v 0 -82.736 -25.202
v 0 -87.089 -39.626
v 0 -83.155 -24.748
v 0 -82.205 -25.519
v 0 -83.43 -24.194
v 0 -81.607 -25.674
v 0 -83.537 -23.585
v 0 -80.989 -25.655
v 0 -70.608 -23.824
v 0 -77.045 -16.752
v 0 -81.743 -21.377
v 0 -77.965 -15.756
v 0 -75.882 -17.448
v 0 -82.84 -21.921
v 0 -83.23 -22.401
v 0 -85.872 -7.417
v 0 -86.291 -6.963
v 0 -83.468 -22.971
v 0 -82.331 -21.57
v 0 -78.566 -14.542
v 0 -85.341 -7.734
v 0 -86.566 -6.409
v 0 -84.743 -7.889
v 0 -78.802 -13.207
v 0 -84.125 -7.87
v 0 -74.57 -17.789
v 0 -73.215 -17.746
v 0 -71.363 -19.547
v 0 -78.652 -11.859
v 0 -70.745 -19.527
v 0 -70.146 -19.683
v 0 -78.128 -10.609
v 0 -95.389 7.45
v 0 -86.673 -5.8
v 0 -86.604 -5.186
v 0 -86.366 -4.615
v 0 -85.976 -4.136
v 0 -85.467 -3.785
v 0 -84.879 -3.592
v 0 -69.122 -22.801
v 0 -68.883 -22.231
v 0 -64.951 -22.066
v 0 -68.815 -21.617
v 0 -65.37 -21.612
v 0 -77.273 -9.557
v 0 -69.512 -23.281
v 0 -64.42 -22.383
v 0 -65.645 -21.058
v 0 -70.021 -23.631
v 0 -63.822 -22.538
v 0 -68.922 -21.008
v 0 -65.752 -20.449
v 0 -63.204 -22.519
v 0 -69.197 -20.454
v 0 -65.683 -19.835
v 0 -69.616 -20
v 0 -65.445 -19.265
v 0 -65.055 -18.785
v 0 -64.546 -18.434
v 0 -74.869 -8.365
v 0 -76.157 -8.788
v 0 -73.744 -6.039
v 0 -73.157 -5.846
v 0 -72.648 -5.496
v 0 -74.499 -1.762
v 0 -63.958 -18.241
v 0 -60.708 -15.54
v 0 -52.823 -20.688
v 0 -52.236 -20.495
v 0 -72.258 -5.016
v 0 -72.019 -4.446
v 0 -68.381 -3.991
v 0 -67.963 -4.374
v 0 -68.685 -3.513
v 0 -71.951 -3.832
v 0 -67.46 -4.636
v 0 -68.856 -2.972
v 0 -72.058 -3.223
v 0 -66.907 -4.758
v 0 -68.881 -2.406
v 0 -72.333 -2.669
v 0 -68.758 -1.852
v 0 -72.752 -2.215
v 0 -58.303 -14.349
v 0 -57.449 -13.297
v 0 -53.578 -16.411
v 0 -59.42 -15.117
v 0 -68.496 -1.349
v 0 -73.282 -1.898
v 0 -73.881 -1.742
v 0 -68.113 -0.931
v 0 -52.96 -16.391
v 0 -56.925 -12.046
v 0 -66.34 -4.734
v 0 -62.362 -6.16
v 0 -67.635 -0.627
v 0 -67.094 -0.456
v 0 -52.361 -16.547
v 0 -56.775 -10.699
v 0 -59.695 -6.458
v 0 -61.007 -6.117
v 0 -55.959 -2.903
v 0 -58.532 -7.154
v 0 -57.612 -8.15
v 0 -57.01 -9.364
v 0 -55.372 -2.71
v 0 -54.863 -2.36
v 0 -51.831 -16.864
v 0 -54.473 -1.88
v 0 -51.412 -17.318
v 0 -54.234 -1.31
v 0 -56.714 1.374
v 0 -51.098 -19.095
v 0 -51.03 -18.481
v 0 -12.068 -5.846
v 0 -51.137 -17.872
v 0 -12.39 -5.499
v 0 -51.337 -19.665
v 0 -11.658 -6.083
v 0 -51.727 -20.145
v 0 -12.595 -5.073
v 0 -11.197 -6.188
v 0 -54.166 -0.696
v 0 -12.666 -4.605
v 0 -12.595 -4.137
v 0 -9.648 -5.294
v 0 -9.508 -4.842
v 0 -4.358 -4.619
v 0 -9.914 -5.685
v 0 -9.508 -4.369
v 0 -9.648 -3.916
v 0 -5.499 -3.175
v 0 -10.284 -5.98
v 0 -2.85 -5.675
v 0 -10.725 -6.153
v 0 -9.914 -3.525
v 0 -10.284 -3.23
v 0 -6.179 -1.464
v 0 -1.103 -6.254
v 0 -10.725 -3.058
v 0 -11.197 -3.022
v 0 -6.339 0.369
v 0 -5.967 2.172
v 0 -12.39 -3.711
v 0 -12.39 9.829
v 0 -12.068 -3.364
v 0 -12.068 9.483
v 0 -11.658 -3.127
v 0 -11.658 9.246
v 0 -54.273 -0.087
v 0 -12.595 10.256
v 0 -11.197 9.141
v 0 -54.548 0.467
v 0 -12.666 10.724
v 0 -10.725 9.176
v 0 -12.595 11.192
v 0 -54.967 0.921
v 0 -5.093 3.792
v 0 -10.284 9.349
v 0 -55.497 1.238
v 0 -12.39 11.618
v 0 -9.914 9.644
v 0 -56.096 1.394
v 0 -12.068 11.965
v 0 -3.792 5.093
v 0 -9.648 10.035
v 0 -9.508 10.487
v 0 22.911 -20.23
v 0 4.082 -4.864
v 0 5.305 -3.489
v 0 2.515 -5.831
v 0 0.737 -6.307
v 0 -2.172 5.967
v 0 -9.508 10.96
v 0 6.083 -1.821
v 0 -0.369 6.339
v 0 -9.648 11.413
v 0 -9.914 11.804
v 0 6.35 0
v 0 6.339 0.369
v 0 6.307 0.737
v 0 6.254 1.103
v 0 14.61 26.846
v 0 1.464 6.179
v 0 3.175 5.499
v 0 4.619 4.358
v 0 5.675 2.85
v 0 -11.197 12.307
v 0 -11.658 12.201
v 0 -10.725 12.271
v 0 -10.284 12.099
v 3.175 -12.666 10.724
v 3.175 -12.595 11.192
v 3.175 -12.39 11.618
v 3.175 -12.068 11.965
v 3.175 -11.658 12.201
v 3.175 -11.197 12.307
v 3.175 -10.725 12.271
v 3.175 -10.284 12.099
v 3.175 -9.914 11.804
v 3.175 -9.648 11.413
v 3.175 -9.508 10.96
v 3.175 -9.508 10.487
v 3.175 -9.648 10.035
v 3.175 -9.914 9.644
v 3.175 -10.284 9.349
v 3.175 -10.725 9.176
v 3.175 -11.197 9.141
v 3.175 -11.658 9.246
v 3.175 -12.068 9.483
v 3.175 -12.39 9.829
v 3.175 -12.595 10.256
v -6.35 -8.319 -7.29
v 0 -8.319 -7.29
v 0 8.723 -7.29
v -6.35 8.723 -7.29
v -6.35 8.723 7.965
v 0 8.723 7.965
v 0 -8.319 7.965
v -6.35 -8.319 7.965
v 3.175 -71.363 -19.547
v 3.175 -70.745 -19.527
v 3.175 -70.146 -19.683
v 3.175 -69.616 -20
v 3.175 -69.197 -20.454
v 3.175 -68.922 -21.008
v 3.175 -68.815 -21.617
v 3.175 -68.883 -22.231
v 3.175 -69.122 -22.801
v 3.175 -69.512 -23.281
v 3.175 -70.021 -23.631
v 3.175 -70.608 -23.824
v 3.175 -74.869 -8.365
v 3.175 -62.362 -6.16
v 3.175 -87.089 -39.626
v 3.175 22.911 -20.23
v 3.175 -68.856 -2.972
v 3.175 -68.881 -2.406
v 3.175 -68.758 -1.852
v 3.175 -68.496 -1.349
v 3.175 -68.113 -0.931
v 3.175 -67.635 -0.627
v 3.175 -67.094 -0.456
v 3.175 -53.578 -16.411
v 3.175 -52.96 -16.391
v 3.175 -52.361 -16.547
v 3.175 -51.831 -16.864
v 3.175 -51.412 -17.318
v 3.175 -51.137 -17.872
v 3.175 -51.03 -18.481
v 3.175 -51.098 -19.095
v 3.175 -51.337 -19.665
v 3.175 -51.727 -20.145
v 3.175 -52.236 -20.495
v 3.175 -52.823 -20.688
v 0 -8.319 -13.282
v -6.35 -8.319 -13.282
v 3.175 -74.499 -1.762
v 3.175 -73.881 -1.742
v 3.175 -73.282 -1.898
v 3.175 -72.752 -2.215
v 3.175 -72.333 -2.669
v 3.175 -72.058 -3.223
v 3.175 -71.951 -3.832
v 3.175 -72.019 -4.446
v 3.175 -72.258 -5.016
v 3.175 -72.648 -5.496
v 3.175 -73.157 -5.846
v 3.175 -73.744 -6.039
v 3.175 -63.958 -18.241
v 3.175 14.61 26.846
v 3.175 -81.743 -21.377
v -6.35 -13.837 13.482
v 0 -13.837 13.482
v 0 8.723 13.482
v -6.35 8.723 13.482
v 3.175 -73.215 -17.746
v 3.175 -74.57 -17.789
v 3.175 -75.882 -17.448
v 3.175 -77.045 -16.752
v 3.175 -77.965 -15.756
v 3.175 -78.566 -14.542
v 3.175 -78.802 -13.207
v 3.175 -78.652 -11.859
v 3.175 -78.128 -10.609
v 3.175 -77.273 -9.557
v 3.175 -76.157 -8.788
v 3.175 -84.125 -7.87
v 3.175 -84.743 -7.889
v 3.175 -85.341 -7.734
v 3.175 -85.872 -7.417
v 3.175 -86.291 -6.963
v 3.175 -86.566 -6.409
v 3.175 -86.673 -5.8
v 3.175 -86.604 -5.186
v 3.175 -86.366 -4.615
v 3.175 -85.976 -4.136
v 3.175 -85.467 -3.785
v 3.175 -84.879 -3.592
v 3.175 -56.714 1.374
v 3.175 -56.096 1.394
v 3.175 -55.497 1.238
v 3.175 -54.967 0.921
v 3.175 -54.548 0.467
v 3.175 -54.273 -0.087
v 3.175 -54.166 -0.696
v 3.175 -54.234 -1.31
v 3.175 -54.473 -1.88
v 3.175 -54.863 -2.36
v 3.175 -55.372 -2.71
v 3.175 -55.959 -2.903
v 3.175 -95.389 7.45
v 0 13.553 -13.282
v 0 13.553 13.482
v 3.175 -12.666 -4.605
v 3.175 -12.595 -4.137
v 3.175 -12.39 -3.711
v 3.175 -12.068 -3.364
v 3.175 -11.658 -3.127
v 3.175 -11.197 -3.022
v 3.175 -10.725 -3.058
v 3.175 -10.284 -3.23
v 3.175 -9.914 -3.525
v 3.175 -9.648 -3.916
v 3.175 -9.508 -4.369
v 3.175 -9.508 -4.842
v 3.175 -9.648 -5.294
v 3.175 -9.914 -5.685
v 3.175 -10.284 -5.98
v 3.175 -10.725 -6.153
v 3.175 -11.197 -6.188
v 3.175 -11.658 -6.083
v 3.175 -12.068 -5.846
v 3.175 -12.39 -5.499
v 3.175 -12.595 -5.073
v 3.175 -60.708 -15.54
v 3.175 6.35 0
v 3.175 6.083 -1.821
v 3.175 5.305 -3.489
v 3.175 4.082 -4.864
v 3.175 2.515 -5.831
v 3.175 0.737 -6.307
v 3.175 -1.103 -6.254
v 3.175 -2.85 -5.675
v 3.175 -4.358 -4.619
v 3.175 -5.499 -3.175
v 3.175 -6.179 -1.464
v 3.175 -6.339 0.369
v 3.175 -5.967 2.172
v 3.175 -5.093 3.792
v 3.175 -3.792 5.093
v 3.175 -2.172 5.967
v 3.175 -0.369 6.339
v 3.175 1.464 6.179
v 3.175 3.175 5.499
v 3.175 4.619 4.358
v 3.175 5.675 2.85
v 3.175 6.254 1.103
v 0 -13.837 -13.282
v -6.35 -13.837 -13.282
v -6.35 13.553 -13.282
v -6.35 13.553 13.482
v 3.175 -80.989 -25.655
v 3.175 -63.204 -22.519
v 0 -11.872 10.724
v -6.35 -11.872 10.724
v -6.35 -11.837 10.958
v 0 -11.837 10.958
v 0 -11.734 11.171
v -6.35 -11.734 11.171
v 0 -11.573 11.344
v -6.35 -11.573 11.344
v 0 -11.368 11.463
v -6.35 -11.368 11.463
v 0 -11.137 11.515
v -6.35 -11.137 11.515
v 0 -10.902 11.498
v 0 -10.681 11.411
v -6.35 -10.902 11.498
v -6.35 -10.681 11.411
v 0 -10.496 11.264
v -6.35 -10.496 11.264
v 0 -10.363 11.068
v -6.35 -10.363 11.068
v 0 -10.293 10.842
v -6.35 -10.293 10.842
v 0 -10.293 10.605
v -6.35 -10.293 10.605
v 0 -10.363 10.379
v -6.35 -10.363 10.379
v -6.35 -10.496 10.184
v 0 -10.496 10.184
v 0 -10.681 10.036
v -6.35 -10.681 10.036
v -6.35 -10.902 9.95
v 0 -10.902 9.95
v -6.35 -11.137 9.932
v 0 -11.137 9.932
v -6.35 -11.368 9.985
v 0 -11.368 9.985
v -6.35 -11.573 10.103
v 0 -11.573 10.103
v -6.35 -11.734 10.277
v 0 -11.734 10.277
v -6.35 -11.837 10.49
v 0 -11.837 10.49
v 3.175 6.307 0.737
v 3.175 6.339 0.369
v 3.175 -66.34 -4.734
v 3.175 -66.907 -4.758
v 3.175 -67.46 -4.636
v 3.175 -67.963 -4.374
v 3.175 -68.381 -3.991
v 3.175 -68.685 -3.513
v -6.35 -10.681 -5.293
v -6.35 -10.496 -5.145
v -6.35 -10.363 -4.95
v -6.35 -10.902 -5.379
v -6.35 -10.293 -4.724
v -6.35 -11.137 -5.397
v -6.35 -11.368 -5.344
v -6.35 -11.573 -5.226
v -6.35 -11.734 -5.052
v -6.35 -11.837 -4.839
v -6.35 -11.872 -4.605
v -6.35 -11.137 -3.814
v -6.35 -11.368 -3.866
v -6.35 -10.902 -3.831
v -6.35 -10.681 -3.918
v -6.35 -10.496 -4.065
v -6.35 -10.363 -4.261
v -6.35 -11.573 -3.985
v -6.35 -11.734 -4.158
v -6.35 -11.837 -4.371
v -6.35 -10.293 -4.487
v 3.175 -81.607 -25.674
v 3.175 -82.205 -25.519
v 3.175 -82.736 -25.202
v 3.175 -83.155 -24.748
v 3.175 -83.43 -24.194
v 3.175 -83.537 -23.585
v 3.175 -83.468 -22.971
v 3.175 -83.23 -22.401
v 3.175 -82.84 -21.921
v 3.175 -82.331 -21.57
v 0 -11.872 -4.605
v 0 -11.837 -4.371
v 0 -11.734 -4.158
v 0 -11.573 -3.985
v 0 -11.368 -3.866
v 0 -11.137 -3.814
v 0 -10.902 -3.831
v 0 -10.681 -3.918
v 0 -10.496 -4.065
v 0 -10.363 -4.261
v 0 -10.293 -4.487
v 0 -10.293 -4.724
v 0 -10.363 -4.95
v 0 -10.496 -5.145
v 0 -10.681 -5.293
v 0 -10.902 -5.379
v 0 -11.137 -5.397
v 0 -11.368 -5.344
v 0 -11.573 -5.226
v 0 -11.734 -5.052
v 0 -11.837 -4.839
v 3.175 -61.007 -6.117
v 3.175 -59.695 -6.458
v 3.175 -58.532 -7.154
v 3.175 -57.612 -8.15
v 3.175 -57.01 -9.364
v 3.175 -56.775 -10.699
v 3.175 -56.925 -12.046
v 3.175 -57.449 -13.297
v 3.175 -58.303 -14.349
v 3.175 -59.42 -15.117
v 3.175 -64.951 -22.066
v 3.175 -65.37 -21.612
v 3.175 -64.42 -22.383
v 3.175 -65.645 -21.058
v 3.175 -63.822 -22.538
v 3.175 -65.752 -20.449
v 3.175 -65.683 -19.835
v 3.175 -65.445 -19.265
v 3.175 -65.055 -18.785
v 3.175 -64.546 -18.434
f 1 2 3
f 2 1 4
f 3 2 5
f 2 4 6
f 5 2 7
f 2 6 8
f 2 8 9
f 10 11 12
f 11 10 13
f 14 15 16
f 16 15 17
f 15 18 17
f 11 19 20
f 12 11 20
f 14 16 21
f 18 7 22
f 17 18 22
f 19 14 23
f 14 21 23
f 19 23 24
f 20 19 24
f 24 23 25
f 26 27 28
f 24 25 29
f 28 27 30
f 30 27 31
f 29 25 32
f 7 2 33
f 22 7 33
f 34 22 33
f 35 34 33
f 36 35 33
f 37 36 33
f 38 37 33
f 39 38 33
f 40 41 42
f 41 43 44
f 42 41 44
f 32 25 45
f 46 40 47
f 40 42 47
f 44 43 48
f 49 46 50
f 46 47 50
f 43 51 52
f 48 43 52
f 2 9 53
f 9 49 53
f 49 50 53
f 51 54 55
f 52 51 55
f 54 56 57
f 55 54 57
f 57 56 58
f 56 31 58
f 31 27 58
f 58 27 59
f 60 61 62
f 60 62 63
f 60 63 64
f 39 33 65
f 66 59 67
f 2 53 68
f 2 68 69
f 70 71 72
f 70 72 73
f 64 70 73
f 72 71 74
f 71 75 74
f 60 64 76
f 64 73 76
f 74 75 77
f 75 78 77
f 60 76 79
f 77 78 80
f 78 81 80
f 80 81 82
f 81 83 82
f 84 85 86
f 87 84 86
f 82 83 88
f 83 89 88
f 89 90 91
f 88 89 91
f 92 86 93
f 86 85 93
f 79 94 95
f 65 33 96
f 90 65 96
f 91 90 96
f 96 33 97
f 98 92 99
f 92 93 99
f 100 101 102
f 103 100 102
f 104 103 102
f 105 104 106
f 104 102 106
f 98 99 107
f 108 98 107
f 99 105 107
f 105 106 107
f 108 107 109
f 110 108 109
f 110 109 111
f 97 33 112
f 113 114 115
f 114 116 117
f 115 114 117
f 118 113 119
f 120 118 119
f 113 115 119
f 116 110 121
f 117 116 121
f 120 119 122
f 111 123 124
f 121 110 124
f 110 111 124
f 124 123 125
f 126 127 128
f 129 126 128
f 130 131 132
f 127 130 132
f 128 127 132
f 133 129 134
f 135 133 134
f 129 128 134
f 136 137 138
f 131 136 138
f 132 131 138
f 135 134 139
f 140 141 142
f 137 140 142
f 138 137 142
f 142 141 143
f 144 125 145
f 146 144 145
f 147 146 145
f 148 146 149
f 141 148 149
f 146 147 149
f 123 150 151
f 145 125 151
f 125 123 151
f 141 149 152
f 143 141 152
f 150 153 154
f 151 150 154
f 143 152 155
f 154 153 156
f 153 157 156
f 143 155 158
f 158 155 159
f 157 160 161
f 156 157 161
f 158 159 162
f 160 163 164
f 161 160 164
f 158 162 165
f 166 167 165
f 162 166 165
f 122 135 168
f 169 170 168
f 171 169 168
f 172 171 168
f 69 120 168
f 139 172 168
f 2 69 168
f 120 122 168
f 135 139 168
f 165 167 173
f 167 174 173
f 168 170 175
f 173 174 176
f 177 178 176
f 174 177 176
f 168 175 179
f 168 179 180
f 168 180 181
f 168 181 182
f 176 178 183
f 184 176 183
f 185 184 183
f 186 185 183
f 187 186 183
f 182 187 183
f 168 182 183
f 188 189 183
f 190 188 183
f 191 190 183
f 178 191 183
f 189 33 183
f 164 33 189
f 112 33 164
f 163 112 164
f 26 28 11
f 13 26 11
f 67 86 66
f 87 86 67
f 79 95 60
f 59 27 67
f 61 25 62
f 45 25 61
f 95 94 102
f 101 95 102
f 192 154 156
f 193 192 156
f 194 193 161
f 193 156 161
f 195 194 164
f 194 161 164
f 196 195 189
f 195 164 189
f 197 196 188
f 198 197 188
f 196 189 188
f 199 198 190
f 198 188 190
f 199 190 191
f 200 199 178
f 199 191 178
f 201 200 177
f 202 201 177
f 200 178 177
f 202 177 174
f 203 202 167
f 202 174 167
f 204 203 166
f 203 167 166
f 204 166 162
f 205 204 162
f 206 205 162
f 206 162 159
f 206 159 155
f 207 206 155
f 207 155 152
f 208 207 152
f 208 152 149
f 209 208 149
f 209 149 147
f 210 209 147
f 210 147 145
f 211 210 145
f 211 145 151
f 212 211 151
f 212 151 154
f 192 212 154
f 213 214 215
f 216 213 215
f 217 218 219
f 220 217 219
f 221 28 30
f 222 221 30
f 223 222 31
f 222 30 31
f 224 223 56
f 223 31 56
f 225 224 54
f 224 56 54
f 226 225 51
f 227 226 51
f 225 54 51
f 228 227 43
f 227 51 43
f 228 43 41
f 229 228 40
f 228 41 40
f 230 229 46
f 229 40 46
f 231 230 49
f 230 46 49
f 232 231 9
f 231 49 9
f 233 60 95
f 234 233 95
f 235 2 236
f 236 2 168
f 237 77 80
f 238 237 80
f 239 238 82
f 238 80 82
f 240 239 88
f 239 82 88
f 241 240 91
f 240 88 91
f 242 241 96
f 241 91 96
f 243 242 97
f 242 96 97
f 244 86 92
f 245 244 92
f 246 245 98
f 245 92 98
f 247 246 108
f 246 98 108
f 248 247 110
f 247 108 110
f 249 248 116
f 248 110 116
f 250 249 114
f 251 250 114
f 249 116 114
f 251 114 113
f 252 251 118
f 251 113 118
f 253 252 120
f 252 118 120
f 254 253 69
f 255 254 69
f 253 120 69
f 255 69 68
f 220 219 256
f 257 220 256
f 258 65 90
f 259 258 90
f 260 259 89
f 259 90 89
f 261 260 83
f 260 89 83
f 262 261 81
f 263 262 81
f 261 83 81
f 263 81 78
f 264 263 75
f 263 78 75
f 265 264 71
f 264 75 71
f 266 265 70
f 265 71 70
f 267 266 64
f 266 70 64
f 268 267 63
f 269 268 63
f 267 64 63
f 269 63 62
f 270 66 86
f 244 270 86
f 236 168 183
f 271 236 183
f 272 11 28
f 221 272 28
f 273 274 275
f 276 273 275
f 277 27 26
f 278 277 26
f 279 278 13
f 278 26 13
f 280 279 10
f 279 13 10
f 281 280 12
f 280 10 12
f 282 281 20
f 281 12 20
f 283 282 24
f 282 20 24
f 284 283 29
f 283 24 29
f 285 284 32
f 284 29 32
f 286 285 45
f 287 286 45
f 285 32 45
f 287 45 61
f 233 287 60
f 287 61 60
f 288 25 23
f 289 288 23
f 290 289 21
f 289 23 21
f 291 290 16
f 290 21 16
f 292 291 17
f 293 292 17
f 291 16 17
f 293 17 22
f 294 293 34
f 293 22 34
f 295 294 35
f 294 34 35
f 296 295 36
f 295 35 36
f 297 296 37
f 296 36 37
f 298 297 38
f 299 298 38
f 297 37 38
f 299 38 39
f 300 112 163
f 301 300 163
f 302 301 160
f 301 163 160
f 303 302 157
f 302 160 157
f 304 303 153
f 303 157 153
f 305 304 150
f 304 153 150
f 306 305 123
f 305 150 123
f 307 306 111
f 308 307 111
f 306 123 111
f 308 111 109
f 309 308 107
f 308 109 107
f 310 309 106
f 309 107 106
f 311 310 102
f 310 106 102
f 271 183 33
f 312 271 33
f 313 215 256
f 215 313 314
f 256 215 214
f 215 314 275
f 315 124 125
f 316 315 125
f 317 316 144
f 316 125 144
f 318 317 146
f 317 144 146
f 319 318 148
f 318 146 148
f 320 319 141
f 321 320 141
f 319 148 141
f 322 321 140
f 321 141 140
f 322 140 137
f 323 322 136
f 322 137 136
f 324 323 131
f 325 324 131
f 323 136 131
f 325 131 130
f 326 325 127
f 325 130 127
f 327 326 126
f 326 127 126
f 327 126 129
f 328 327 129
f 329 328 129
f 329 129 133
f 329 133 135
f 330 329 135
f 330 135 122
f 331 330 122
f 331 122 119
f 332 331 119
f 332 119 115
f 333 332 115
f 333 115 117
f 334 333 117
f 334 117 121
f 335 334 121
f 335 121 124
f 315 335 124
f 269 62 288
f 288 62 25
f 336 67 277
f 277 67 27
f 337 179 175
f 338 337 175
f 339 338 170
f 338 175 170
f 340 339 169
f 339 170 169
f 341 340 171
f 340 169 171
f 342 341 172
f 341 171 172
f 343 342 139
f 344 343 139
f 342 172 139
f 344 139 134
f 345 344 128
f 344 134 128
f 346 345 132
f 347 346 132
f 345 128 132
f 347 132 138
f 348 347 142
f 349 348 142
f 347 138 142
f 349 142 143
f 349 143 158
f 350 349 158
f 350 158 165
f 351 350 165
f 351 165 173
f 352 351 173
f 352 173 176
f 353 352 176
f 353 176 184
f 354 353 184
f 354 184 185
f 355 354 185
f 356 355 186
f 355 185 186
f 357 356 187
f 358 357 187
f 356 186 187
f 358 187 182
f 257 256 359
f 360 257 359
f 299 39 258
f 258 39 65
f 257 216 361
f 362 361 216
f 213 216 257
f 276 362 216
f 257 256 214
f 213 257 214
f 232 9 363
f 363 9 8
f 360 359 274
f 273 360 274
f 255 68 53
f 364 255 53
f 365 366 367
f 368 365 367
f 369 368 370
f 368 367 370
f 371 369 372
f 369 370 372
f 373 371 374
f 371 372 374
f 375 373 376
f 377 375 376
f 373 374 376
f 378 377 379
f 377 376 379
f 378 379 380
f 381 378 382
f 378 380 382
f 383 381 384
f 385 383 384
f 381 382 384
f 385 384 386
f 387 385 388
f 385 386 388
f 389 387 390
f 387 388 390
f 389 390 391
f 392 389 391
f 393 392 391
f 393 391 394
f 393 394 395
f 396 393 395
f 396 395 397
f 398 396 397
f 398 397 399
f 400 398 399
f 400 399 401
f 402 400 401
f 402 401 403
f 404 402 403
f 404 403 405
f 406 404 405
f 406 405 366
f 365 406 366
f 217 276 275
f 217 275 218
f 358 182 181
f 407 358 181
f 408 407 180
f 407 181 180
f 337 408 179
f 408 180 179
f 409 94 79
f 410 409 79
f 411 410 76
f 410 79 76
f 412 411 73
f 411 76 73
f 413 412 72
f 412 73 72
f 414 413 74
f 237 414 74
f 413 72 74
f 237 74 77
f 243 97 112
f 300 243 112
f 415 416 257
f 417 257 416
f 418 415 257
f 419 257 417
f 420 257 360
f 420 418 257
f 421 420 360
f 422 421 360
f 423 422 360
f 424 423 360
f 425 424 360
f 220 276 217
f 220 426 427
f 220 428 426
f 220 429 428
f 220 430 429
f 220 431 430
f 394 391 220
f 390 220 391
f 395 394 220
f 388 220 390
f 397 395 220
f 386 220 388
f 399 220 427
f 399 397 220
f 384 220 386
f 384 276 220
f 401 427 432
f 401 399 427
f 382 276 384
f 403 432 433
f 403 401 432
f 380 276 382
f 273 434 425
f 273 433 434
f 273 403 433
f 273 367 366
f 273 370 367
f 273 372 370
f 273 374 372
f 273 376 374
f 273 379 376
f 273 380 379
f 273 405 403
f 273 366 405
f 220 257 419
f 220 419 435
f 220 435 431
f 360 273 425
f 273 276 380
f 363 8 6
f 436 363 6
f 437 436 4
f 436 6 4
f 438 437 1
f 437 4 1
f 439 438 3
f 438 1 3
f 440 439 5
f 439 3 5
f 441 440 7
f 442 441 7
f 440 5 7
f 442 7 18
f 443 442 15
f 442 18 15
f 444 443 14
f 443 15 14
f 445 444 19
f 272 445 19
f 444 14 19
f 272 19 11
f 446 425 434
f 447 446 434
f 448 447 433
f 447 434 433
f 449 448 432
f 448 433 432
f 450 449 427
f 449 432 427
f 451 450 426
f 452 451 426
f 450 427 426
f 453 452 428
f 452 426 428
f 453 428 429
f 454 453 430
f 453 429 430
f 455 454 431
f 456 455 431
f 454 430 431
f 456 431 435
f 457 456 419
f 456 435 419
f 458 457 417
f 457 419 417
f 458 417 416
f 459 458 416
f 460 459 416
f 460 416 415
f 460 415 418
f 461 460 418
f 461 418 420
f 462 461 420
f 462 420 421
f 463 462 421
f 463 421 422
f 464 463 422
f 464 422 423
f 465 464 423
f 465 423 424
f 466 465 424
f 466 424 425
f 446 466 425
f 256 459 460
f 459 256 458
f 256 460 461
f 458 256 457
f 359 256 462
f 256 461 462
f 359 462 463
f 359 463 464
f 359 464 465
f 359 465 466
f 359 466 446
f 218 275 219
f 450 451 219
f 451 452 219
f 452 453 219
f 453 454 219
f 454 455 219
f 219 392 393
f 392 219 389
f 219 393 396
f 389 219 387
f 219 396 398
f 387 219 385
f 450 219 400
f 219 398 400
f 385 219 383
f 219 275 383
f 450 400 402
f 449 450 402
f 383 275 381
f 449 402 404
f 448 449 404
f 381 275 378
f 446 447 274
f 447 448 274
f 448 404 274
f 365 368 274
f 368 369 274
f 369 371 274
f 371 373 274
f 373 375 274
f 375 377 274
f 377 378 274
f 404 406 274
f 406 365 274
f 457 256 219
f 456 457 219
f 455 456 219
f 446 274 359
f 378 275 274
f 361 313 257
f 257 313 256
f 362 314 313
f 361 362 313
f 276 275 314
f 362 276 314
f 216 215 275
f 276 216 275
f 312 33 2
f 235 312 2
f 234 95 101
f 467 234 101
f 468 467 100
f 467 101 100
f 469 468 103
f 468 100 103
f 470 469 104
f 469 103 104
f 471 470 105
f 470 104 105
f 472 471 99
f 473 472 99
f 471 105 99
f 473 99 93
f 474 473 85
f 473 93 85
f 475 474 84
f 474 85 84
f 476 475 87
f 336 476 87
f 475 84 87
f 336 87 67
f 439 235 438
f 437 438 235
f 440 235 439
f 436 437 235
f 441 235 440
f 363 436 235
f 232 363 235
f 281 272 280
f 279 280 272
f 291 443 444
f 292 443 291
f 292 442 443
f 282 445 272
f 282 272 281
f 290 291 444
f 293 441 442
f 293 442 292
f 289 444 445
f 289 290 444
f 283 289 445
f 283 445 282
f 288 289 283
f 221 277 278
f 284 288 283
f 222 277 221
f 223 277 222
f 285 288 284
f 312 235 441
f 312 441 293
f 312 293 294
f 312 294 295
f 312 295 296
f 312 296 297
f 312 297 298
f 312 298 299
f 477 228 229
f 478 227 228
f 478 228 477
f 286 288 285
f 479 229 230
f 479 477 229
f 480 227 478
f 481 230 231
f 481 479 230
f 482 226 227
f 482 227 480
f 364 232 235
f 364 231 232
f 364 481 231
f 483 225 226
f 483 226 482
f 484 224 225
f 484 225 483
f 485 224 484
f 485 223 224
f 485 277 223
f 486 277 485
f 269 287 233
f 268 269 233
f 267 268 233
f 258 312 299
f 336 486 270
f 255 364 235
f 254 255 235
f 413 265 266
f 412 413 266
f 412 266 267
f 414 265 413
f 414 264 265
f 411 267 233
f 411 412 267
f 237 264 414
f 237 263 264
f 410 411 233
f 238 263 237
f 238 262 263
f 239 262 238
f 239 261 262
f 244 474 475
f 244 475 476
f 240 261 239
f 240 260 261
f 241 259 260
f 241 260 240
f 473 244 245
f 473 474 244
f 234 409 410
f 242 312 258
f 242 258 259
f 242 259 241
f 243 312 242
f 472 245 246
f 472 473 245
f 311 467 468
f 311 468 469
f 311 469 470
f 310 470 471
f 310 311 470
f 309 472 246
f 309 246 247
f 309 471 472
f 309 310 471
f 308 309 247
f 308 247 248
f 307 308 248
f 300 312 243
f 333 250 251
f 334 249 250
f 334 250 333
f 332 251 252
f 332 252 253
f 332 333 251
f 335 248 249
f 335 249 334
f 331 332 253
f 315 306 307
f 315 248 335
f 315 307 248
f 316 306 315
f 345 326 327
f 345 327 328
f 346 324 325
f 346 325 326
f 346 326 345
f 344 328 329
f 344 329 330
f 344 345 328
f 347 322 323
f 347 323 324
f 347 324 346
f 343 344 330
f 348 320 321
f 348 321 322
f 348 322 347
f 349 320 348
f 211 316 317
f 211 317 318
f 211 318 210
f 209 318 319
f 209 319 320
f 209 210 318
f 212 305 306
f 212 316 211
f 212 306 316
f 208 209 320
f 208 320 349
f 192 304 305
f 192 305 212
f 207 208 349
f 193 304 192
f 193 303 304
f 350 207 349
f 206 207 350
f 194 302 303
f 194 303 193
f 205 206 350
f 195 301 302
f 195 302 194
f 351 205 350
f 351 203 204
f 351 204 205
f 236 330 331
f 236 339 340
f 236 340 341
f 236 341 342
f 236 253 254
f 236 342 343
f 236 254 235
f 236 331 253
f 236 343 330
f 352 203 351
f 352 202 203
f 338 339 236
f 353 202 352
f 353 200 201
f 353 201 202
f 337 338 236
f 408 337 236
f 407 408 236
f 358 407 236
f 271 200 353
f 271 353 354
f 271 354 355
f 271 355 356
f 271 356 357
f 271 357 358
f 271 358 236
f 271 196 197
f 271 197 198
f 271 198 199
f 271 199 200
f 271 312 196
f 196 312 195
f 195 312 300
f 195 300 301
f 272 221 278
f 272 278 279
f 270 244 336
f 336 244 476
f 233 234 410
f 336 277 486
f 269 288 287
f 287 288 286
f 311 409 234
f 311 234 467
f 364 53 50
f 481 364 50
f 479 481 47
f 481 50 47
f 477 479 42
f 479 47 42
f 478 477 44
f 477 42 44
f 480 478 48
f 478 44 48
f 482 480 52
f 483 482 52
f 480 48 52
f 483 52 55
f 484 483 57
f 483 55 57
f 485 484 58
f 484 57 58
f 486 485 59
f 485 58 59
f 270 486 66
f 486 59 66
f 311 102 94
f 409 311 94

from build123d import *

# Parameters (mm, degrees)
F1_DEPTH = 3.175
F3_DEPTH = 6.35
F5_DEPTH = 6.35
F6_R     = 0.79375
F7_DEPTH = 9.526
F8_R     = 1.5875
F9_DEPTH = 3.176


with BuildPart() as f1:
    # F0 (on Right) → F1 (new body)
    with BuildSketch(Plane.YZ):
        Polygon((22.9110222486, -20.2302862433), (18.7605876949, 3.3079977846), (14.6101531412, 26.8462818124), (-95.3894260431, 7.4503881356), (-87.0885569358, -39.6261799201), align=None)
        with BuildLine():
            ThreePointArc((-80.9892019725, -25.6547811042), (-83.5050207172, -23.8931858544), (-81.7434254674, -21.3773671097))
            Line((-81.7434254674, -21.3773671097), (-71.3625669429, -19.546941669))
            ThreePointArc((-71.3625669429, -19.546941669), (-68.8467481982, -21.3085369187), (-70.608343448, -23.8243556634))
            Line((-70.608343448, -23.8243556634), (-80.9892019725, -25.6547811042))
        make_face(mode=Mode.SUBTRACT)
        with BuildLine():
            ThreePointArc((-62.3617270854, -6.1600858096), (-56.8445807155, -10.0232332872), (-60.7077281931, -15.5403796571))
            Line((-60.7077281931, -15.5403796571), (-73.2147866563, -17.7457115134))
            ThreePointArc((-73.2147866563, -17.7457115134), (-78.7319330262, -13.8825640358), (-74.8687855486, -8.365417666))
            Line((-74.8687855486, -8.365417666), (-62.3617270854, -6.1600858096))
        make_face(mode=Mode.SUBTRACT)
        with BuildLine():
            ThreePointArc((-63.2041648378, -22.5187992044), (-65.7199835824, -20.7572039546), (-63.9583883327, -18.24138521))
            Line((-63.9583883327, -18.24138521), (-53.5775298082, -16.4109597692))
            ThreePointArc((-53.5775298082, -16.4109597692), (-51.0617110635, -18.172555019), (-52.8233063133, -20.6883737636))
            Line((-52.8233063133, -20.6883737636), (-63.2041648378, -22.5187992044))
        make_face(mode=Mode.SUBTRACT)
        with BuildLine():
            ThreePointArc((-74.4985488427, -1.7619045342), (-71.982730098, -3.523499784), (-73.7443253478, -6.0393185286))
            Line((-73.7443253478, -6.0393185286), (-84.1251838723, -7.8697439694))
            ThreePointArc((-84.1251838723, -7.8697439694), (-86.6410026169, -6.1081487197), (-84.8794073672, -3.592329975))
            Line((-84.8794073672, -3.592329975), (-74.4985488427, -1.7619045342))
        make_face(mode=Mode.SUBTRACT)
        with BuildLine():
            ThreePointArc((-68.8559654822, -2.9721668199), (-68.4962109796, -1.3494191256), (-67.0943702324, -0.4563480752))
            Line((-67.0943702324, -0.4563480752), (-56.7135117079, 1.3740773655))
            ThreePointArc((-56.7135117079, 1.3740773655), (-54.1976929633, -0.3875178842), (-55.959288213, -2.9033366289))
            Line((-55.959288213, -2.9033366289), (-66.3401467375, -4.7337620697))
            ThreePointArc((-66.3401467375, -4.7337620697), (-67.9628944318, -4.374007567), (-68.8559654822, -2.9721668199))
        make_face(mode=Mode.SUBTRACT)
        with BuildLine():
            ThreePointArc((6.2535292316, 1.1026659282), (6.3258363329, 0.5534389664), (6.35, 0))
            ThreePointArc((6.35, 0), (-6.3258363329, -0.5534389664), (6.2535292316, 1.1026659282))
        make_face(mode=Mode.SUBTRACT)
    extrude(amount=F1_DEPTH)


with BuildPart() as f3:
    # F2 (on face) → F3 (new body)
    with BuildSketch(Plane(origin=(0, 0, 0), x_dir=(0, -1, 0), z_dir=(-1, 0, 0))):
        Polygon((8.3188572899, 7.9650981352), (8.3188572899, -13.2820438594), (13.8374944884, -13.2820438594), (13.8374944884, 13.4823722765), (-8.72339122, 13.4823722765), (-8.72339122, 7.9650981352), align=None)
    extrude(amount=F3_DEPTH)


with BuildPart() as f5:
    # F4 (on face) → F5 (new body, through all)
    with BuildSketch(Plane(origin=(0, 0, 0), x_dir=(0, -1, 0), z_dir=(-1, 0, 0))):
        Polygon((-8.72339122, -7.2899092047), (-8.72339122, 13.4823722765), (-13.5532086715, 13.4823722765), (-13.5532086715, -13.2820438594), (8.3188572899, -13.2820438594), (8.3188572899, -7.2899092047), align=None)
    extrude(amount=F5_DEPTH)


with BuildPart() as f7_tool:
    # F6 (on face) → F7 (new body, through all)
    with BuildSketch(Plane(origin=(-6.35, 0, 0), x_dir=(0, -1, 0), z_dir=(-1, 0, 0))):
        with Locations((11.0781758891, 10.7237352058)):
            Circle(F6_R)
        with Locations((11.0781758891, -4.6052122489)):
            Circle(F6_R)
    extrude(amount=-F7_DEPTH)


with BuildPart() as f1_1:
    add(f1.part)

    # F7: cut by f7_tool
    add(f7_tool.part, mode=Mode.SUBTRACT)

    # F8 (on face) → F9 (cut, through all)
    with BuildSketch(Plane(origin=(0, 0, 0), x_dir=(0, -1, 0), z_dir=(-1, 0, 0))):
        with Locations((11.0781758891, 10.7237352058)):
            Circle(F8_R)
        with Locations((11.0781758891, -4.6052122489)):
            Circle(F8_R)
    extrude(amount=-F9_DEPTH, mode=Mode.SUBTRACT)


with BuildPart() as f3_1:
    add(f3.part)

    # F7: cut by f7_tool
    add(f7_tool.part, mode=Mode.SUBTRACT)


solid = Compound([f5.part, f1_1.part, f3_1.part])
